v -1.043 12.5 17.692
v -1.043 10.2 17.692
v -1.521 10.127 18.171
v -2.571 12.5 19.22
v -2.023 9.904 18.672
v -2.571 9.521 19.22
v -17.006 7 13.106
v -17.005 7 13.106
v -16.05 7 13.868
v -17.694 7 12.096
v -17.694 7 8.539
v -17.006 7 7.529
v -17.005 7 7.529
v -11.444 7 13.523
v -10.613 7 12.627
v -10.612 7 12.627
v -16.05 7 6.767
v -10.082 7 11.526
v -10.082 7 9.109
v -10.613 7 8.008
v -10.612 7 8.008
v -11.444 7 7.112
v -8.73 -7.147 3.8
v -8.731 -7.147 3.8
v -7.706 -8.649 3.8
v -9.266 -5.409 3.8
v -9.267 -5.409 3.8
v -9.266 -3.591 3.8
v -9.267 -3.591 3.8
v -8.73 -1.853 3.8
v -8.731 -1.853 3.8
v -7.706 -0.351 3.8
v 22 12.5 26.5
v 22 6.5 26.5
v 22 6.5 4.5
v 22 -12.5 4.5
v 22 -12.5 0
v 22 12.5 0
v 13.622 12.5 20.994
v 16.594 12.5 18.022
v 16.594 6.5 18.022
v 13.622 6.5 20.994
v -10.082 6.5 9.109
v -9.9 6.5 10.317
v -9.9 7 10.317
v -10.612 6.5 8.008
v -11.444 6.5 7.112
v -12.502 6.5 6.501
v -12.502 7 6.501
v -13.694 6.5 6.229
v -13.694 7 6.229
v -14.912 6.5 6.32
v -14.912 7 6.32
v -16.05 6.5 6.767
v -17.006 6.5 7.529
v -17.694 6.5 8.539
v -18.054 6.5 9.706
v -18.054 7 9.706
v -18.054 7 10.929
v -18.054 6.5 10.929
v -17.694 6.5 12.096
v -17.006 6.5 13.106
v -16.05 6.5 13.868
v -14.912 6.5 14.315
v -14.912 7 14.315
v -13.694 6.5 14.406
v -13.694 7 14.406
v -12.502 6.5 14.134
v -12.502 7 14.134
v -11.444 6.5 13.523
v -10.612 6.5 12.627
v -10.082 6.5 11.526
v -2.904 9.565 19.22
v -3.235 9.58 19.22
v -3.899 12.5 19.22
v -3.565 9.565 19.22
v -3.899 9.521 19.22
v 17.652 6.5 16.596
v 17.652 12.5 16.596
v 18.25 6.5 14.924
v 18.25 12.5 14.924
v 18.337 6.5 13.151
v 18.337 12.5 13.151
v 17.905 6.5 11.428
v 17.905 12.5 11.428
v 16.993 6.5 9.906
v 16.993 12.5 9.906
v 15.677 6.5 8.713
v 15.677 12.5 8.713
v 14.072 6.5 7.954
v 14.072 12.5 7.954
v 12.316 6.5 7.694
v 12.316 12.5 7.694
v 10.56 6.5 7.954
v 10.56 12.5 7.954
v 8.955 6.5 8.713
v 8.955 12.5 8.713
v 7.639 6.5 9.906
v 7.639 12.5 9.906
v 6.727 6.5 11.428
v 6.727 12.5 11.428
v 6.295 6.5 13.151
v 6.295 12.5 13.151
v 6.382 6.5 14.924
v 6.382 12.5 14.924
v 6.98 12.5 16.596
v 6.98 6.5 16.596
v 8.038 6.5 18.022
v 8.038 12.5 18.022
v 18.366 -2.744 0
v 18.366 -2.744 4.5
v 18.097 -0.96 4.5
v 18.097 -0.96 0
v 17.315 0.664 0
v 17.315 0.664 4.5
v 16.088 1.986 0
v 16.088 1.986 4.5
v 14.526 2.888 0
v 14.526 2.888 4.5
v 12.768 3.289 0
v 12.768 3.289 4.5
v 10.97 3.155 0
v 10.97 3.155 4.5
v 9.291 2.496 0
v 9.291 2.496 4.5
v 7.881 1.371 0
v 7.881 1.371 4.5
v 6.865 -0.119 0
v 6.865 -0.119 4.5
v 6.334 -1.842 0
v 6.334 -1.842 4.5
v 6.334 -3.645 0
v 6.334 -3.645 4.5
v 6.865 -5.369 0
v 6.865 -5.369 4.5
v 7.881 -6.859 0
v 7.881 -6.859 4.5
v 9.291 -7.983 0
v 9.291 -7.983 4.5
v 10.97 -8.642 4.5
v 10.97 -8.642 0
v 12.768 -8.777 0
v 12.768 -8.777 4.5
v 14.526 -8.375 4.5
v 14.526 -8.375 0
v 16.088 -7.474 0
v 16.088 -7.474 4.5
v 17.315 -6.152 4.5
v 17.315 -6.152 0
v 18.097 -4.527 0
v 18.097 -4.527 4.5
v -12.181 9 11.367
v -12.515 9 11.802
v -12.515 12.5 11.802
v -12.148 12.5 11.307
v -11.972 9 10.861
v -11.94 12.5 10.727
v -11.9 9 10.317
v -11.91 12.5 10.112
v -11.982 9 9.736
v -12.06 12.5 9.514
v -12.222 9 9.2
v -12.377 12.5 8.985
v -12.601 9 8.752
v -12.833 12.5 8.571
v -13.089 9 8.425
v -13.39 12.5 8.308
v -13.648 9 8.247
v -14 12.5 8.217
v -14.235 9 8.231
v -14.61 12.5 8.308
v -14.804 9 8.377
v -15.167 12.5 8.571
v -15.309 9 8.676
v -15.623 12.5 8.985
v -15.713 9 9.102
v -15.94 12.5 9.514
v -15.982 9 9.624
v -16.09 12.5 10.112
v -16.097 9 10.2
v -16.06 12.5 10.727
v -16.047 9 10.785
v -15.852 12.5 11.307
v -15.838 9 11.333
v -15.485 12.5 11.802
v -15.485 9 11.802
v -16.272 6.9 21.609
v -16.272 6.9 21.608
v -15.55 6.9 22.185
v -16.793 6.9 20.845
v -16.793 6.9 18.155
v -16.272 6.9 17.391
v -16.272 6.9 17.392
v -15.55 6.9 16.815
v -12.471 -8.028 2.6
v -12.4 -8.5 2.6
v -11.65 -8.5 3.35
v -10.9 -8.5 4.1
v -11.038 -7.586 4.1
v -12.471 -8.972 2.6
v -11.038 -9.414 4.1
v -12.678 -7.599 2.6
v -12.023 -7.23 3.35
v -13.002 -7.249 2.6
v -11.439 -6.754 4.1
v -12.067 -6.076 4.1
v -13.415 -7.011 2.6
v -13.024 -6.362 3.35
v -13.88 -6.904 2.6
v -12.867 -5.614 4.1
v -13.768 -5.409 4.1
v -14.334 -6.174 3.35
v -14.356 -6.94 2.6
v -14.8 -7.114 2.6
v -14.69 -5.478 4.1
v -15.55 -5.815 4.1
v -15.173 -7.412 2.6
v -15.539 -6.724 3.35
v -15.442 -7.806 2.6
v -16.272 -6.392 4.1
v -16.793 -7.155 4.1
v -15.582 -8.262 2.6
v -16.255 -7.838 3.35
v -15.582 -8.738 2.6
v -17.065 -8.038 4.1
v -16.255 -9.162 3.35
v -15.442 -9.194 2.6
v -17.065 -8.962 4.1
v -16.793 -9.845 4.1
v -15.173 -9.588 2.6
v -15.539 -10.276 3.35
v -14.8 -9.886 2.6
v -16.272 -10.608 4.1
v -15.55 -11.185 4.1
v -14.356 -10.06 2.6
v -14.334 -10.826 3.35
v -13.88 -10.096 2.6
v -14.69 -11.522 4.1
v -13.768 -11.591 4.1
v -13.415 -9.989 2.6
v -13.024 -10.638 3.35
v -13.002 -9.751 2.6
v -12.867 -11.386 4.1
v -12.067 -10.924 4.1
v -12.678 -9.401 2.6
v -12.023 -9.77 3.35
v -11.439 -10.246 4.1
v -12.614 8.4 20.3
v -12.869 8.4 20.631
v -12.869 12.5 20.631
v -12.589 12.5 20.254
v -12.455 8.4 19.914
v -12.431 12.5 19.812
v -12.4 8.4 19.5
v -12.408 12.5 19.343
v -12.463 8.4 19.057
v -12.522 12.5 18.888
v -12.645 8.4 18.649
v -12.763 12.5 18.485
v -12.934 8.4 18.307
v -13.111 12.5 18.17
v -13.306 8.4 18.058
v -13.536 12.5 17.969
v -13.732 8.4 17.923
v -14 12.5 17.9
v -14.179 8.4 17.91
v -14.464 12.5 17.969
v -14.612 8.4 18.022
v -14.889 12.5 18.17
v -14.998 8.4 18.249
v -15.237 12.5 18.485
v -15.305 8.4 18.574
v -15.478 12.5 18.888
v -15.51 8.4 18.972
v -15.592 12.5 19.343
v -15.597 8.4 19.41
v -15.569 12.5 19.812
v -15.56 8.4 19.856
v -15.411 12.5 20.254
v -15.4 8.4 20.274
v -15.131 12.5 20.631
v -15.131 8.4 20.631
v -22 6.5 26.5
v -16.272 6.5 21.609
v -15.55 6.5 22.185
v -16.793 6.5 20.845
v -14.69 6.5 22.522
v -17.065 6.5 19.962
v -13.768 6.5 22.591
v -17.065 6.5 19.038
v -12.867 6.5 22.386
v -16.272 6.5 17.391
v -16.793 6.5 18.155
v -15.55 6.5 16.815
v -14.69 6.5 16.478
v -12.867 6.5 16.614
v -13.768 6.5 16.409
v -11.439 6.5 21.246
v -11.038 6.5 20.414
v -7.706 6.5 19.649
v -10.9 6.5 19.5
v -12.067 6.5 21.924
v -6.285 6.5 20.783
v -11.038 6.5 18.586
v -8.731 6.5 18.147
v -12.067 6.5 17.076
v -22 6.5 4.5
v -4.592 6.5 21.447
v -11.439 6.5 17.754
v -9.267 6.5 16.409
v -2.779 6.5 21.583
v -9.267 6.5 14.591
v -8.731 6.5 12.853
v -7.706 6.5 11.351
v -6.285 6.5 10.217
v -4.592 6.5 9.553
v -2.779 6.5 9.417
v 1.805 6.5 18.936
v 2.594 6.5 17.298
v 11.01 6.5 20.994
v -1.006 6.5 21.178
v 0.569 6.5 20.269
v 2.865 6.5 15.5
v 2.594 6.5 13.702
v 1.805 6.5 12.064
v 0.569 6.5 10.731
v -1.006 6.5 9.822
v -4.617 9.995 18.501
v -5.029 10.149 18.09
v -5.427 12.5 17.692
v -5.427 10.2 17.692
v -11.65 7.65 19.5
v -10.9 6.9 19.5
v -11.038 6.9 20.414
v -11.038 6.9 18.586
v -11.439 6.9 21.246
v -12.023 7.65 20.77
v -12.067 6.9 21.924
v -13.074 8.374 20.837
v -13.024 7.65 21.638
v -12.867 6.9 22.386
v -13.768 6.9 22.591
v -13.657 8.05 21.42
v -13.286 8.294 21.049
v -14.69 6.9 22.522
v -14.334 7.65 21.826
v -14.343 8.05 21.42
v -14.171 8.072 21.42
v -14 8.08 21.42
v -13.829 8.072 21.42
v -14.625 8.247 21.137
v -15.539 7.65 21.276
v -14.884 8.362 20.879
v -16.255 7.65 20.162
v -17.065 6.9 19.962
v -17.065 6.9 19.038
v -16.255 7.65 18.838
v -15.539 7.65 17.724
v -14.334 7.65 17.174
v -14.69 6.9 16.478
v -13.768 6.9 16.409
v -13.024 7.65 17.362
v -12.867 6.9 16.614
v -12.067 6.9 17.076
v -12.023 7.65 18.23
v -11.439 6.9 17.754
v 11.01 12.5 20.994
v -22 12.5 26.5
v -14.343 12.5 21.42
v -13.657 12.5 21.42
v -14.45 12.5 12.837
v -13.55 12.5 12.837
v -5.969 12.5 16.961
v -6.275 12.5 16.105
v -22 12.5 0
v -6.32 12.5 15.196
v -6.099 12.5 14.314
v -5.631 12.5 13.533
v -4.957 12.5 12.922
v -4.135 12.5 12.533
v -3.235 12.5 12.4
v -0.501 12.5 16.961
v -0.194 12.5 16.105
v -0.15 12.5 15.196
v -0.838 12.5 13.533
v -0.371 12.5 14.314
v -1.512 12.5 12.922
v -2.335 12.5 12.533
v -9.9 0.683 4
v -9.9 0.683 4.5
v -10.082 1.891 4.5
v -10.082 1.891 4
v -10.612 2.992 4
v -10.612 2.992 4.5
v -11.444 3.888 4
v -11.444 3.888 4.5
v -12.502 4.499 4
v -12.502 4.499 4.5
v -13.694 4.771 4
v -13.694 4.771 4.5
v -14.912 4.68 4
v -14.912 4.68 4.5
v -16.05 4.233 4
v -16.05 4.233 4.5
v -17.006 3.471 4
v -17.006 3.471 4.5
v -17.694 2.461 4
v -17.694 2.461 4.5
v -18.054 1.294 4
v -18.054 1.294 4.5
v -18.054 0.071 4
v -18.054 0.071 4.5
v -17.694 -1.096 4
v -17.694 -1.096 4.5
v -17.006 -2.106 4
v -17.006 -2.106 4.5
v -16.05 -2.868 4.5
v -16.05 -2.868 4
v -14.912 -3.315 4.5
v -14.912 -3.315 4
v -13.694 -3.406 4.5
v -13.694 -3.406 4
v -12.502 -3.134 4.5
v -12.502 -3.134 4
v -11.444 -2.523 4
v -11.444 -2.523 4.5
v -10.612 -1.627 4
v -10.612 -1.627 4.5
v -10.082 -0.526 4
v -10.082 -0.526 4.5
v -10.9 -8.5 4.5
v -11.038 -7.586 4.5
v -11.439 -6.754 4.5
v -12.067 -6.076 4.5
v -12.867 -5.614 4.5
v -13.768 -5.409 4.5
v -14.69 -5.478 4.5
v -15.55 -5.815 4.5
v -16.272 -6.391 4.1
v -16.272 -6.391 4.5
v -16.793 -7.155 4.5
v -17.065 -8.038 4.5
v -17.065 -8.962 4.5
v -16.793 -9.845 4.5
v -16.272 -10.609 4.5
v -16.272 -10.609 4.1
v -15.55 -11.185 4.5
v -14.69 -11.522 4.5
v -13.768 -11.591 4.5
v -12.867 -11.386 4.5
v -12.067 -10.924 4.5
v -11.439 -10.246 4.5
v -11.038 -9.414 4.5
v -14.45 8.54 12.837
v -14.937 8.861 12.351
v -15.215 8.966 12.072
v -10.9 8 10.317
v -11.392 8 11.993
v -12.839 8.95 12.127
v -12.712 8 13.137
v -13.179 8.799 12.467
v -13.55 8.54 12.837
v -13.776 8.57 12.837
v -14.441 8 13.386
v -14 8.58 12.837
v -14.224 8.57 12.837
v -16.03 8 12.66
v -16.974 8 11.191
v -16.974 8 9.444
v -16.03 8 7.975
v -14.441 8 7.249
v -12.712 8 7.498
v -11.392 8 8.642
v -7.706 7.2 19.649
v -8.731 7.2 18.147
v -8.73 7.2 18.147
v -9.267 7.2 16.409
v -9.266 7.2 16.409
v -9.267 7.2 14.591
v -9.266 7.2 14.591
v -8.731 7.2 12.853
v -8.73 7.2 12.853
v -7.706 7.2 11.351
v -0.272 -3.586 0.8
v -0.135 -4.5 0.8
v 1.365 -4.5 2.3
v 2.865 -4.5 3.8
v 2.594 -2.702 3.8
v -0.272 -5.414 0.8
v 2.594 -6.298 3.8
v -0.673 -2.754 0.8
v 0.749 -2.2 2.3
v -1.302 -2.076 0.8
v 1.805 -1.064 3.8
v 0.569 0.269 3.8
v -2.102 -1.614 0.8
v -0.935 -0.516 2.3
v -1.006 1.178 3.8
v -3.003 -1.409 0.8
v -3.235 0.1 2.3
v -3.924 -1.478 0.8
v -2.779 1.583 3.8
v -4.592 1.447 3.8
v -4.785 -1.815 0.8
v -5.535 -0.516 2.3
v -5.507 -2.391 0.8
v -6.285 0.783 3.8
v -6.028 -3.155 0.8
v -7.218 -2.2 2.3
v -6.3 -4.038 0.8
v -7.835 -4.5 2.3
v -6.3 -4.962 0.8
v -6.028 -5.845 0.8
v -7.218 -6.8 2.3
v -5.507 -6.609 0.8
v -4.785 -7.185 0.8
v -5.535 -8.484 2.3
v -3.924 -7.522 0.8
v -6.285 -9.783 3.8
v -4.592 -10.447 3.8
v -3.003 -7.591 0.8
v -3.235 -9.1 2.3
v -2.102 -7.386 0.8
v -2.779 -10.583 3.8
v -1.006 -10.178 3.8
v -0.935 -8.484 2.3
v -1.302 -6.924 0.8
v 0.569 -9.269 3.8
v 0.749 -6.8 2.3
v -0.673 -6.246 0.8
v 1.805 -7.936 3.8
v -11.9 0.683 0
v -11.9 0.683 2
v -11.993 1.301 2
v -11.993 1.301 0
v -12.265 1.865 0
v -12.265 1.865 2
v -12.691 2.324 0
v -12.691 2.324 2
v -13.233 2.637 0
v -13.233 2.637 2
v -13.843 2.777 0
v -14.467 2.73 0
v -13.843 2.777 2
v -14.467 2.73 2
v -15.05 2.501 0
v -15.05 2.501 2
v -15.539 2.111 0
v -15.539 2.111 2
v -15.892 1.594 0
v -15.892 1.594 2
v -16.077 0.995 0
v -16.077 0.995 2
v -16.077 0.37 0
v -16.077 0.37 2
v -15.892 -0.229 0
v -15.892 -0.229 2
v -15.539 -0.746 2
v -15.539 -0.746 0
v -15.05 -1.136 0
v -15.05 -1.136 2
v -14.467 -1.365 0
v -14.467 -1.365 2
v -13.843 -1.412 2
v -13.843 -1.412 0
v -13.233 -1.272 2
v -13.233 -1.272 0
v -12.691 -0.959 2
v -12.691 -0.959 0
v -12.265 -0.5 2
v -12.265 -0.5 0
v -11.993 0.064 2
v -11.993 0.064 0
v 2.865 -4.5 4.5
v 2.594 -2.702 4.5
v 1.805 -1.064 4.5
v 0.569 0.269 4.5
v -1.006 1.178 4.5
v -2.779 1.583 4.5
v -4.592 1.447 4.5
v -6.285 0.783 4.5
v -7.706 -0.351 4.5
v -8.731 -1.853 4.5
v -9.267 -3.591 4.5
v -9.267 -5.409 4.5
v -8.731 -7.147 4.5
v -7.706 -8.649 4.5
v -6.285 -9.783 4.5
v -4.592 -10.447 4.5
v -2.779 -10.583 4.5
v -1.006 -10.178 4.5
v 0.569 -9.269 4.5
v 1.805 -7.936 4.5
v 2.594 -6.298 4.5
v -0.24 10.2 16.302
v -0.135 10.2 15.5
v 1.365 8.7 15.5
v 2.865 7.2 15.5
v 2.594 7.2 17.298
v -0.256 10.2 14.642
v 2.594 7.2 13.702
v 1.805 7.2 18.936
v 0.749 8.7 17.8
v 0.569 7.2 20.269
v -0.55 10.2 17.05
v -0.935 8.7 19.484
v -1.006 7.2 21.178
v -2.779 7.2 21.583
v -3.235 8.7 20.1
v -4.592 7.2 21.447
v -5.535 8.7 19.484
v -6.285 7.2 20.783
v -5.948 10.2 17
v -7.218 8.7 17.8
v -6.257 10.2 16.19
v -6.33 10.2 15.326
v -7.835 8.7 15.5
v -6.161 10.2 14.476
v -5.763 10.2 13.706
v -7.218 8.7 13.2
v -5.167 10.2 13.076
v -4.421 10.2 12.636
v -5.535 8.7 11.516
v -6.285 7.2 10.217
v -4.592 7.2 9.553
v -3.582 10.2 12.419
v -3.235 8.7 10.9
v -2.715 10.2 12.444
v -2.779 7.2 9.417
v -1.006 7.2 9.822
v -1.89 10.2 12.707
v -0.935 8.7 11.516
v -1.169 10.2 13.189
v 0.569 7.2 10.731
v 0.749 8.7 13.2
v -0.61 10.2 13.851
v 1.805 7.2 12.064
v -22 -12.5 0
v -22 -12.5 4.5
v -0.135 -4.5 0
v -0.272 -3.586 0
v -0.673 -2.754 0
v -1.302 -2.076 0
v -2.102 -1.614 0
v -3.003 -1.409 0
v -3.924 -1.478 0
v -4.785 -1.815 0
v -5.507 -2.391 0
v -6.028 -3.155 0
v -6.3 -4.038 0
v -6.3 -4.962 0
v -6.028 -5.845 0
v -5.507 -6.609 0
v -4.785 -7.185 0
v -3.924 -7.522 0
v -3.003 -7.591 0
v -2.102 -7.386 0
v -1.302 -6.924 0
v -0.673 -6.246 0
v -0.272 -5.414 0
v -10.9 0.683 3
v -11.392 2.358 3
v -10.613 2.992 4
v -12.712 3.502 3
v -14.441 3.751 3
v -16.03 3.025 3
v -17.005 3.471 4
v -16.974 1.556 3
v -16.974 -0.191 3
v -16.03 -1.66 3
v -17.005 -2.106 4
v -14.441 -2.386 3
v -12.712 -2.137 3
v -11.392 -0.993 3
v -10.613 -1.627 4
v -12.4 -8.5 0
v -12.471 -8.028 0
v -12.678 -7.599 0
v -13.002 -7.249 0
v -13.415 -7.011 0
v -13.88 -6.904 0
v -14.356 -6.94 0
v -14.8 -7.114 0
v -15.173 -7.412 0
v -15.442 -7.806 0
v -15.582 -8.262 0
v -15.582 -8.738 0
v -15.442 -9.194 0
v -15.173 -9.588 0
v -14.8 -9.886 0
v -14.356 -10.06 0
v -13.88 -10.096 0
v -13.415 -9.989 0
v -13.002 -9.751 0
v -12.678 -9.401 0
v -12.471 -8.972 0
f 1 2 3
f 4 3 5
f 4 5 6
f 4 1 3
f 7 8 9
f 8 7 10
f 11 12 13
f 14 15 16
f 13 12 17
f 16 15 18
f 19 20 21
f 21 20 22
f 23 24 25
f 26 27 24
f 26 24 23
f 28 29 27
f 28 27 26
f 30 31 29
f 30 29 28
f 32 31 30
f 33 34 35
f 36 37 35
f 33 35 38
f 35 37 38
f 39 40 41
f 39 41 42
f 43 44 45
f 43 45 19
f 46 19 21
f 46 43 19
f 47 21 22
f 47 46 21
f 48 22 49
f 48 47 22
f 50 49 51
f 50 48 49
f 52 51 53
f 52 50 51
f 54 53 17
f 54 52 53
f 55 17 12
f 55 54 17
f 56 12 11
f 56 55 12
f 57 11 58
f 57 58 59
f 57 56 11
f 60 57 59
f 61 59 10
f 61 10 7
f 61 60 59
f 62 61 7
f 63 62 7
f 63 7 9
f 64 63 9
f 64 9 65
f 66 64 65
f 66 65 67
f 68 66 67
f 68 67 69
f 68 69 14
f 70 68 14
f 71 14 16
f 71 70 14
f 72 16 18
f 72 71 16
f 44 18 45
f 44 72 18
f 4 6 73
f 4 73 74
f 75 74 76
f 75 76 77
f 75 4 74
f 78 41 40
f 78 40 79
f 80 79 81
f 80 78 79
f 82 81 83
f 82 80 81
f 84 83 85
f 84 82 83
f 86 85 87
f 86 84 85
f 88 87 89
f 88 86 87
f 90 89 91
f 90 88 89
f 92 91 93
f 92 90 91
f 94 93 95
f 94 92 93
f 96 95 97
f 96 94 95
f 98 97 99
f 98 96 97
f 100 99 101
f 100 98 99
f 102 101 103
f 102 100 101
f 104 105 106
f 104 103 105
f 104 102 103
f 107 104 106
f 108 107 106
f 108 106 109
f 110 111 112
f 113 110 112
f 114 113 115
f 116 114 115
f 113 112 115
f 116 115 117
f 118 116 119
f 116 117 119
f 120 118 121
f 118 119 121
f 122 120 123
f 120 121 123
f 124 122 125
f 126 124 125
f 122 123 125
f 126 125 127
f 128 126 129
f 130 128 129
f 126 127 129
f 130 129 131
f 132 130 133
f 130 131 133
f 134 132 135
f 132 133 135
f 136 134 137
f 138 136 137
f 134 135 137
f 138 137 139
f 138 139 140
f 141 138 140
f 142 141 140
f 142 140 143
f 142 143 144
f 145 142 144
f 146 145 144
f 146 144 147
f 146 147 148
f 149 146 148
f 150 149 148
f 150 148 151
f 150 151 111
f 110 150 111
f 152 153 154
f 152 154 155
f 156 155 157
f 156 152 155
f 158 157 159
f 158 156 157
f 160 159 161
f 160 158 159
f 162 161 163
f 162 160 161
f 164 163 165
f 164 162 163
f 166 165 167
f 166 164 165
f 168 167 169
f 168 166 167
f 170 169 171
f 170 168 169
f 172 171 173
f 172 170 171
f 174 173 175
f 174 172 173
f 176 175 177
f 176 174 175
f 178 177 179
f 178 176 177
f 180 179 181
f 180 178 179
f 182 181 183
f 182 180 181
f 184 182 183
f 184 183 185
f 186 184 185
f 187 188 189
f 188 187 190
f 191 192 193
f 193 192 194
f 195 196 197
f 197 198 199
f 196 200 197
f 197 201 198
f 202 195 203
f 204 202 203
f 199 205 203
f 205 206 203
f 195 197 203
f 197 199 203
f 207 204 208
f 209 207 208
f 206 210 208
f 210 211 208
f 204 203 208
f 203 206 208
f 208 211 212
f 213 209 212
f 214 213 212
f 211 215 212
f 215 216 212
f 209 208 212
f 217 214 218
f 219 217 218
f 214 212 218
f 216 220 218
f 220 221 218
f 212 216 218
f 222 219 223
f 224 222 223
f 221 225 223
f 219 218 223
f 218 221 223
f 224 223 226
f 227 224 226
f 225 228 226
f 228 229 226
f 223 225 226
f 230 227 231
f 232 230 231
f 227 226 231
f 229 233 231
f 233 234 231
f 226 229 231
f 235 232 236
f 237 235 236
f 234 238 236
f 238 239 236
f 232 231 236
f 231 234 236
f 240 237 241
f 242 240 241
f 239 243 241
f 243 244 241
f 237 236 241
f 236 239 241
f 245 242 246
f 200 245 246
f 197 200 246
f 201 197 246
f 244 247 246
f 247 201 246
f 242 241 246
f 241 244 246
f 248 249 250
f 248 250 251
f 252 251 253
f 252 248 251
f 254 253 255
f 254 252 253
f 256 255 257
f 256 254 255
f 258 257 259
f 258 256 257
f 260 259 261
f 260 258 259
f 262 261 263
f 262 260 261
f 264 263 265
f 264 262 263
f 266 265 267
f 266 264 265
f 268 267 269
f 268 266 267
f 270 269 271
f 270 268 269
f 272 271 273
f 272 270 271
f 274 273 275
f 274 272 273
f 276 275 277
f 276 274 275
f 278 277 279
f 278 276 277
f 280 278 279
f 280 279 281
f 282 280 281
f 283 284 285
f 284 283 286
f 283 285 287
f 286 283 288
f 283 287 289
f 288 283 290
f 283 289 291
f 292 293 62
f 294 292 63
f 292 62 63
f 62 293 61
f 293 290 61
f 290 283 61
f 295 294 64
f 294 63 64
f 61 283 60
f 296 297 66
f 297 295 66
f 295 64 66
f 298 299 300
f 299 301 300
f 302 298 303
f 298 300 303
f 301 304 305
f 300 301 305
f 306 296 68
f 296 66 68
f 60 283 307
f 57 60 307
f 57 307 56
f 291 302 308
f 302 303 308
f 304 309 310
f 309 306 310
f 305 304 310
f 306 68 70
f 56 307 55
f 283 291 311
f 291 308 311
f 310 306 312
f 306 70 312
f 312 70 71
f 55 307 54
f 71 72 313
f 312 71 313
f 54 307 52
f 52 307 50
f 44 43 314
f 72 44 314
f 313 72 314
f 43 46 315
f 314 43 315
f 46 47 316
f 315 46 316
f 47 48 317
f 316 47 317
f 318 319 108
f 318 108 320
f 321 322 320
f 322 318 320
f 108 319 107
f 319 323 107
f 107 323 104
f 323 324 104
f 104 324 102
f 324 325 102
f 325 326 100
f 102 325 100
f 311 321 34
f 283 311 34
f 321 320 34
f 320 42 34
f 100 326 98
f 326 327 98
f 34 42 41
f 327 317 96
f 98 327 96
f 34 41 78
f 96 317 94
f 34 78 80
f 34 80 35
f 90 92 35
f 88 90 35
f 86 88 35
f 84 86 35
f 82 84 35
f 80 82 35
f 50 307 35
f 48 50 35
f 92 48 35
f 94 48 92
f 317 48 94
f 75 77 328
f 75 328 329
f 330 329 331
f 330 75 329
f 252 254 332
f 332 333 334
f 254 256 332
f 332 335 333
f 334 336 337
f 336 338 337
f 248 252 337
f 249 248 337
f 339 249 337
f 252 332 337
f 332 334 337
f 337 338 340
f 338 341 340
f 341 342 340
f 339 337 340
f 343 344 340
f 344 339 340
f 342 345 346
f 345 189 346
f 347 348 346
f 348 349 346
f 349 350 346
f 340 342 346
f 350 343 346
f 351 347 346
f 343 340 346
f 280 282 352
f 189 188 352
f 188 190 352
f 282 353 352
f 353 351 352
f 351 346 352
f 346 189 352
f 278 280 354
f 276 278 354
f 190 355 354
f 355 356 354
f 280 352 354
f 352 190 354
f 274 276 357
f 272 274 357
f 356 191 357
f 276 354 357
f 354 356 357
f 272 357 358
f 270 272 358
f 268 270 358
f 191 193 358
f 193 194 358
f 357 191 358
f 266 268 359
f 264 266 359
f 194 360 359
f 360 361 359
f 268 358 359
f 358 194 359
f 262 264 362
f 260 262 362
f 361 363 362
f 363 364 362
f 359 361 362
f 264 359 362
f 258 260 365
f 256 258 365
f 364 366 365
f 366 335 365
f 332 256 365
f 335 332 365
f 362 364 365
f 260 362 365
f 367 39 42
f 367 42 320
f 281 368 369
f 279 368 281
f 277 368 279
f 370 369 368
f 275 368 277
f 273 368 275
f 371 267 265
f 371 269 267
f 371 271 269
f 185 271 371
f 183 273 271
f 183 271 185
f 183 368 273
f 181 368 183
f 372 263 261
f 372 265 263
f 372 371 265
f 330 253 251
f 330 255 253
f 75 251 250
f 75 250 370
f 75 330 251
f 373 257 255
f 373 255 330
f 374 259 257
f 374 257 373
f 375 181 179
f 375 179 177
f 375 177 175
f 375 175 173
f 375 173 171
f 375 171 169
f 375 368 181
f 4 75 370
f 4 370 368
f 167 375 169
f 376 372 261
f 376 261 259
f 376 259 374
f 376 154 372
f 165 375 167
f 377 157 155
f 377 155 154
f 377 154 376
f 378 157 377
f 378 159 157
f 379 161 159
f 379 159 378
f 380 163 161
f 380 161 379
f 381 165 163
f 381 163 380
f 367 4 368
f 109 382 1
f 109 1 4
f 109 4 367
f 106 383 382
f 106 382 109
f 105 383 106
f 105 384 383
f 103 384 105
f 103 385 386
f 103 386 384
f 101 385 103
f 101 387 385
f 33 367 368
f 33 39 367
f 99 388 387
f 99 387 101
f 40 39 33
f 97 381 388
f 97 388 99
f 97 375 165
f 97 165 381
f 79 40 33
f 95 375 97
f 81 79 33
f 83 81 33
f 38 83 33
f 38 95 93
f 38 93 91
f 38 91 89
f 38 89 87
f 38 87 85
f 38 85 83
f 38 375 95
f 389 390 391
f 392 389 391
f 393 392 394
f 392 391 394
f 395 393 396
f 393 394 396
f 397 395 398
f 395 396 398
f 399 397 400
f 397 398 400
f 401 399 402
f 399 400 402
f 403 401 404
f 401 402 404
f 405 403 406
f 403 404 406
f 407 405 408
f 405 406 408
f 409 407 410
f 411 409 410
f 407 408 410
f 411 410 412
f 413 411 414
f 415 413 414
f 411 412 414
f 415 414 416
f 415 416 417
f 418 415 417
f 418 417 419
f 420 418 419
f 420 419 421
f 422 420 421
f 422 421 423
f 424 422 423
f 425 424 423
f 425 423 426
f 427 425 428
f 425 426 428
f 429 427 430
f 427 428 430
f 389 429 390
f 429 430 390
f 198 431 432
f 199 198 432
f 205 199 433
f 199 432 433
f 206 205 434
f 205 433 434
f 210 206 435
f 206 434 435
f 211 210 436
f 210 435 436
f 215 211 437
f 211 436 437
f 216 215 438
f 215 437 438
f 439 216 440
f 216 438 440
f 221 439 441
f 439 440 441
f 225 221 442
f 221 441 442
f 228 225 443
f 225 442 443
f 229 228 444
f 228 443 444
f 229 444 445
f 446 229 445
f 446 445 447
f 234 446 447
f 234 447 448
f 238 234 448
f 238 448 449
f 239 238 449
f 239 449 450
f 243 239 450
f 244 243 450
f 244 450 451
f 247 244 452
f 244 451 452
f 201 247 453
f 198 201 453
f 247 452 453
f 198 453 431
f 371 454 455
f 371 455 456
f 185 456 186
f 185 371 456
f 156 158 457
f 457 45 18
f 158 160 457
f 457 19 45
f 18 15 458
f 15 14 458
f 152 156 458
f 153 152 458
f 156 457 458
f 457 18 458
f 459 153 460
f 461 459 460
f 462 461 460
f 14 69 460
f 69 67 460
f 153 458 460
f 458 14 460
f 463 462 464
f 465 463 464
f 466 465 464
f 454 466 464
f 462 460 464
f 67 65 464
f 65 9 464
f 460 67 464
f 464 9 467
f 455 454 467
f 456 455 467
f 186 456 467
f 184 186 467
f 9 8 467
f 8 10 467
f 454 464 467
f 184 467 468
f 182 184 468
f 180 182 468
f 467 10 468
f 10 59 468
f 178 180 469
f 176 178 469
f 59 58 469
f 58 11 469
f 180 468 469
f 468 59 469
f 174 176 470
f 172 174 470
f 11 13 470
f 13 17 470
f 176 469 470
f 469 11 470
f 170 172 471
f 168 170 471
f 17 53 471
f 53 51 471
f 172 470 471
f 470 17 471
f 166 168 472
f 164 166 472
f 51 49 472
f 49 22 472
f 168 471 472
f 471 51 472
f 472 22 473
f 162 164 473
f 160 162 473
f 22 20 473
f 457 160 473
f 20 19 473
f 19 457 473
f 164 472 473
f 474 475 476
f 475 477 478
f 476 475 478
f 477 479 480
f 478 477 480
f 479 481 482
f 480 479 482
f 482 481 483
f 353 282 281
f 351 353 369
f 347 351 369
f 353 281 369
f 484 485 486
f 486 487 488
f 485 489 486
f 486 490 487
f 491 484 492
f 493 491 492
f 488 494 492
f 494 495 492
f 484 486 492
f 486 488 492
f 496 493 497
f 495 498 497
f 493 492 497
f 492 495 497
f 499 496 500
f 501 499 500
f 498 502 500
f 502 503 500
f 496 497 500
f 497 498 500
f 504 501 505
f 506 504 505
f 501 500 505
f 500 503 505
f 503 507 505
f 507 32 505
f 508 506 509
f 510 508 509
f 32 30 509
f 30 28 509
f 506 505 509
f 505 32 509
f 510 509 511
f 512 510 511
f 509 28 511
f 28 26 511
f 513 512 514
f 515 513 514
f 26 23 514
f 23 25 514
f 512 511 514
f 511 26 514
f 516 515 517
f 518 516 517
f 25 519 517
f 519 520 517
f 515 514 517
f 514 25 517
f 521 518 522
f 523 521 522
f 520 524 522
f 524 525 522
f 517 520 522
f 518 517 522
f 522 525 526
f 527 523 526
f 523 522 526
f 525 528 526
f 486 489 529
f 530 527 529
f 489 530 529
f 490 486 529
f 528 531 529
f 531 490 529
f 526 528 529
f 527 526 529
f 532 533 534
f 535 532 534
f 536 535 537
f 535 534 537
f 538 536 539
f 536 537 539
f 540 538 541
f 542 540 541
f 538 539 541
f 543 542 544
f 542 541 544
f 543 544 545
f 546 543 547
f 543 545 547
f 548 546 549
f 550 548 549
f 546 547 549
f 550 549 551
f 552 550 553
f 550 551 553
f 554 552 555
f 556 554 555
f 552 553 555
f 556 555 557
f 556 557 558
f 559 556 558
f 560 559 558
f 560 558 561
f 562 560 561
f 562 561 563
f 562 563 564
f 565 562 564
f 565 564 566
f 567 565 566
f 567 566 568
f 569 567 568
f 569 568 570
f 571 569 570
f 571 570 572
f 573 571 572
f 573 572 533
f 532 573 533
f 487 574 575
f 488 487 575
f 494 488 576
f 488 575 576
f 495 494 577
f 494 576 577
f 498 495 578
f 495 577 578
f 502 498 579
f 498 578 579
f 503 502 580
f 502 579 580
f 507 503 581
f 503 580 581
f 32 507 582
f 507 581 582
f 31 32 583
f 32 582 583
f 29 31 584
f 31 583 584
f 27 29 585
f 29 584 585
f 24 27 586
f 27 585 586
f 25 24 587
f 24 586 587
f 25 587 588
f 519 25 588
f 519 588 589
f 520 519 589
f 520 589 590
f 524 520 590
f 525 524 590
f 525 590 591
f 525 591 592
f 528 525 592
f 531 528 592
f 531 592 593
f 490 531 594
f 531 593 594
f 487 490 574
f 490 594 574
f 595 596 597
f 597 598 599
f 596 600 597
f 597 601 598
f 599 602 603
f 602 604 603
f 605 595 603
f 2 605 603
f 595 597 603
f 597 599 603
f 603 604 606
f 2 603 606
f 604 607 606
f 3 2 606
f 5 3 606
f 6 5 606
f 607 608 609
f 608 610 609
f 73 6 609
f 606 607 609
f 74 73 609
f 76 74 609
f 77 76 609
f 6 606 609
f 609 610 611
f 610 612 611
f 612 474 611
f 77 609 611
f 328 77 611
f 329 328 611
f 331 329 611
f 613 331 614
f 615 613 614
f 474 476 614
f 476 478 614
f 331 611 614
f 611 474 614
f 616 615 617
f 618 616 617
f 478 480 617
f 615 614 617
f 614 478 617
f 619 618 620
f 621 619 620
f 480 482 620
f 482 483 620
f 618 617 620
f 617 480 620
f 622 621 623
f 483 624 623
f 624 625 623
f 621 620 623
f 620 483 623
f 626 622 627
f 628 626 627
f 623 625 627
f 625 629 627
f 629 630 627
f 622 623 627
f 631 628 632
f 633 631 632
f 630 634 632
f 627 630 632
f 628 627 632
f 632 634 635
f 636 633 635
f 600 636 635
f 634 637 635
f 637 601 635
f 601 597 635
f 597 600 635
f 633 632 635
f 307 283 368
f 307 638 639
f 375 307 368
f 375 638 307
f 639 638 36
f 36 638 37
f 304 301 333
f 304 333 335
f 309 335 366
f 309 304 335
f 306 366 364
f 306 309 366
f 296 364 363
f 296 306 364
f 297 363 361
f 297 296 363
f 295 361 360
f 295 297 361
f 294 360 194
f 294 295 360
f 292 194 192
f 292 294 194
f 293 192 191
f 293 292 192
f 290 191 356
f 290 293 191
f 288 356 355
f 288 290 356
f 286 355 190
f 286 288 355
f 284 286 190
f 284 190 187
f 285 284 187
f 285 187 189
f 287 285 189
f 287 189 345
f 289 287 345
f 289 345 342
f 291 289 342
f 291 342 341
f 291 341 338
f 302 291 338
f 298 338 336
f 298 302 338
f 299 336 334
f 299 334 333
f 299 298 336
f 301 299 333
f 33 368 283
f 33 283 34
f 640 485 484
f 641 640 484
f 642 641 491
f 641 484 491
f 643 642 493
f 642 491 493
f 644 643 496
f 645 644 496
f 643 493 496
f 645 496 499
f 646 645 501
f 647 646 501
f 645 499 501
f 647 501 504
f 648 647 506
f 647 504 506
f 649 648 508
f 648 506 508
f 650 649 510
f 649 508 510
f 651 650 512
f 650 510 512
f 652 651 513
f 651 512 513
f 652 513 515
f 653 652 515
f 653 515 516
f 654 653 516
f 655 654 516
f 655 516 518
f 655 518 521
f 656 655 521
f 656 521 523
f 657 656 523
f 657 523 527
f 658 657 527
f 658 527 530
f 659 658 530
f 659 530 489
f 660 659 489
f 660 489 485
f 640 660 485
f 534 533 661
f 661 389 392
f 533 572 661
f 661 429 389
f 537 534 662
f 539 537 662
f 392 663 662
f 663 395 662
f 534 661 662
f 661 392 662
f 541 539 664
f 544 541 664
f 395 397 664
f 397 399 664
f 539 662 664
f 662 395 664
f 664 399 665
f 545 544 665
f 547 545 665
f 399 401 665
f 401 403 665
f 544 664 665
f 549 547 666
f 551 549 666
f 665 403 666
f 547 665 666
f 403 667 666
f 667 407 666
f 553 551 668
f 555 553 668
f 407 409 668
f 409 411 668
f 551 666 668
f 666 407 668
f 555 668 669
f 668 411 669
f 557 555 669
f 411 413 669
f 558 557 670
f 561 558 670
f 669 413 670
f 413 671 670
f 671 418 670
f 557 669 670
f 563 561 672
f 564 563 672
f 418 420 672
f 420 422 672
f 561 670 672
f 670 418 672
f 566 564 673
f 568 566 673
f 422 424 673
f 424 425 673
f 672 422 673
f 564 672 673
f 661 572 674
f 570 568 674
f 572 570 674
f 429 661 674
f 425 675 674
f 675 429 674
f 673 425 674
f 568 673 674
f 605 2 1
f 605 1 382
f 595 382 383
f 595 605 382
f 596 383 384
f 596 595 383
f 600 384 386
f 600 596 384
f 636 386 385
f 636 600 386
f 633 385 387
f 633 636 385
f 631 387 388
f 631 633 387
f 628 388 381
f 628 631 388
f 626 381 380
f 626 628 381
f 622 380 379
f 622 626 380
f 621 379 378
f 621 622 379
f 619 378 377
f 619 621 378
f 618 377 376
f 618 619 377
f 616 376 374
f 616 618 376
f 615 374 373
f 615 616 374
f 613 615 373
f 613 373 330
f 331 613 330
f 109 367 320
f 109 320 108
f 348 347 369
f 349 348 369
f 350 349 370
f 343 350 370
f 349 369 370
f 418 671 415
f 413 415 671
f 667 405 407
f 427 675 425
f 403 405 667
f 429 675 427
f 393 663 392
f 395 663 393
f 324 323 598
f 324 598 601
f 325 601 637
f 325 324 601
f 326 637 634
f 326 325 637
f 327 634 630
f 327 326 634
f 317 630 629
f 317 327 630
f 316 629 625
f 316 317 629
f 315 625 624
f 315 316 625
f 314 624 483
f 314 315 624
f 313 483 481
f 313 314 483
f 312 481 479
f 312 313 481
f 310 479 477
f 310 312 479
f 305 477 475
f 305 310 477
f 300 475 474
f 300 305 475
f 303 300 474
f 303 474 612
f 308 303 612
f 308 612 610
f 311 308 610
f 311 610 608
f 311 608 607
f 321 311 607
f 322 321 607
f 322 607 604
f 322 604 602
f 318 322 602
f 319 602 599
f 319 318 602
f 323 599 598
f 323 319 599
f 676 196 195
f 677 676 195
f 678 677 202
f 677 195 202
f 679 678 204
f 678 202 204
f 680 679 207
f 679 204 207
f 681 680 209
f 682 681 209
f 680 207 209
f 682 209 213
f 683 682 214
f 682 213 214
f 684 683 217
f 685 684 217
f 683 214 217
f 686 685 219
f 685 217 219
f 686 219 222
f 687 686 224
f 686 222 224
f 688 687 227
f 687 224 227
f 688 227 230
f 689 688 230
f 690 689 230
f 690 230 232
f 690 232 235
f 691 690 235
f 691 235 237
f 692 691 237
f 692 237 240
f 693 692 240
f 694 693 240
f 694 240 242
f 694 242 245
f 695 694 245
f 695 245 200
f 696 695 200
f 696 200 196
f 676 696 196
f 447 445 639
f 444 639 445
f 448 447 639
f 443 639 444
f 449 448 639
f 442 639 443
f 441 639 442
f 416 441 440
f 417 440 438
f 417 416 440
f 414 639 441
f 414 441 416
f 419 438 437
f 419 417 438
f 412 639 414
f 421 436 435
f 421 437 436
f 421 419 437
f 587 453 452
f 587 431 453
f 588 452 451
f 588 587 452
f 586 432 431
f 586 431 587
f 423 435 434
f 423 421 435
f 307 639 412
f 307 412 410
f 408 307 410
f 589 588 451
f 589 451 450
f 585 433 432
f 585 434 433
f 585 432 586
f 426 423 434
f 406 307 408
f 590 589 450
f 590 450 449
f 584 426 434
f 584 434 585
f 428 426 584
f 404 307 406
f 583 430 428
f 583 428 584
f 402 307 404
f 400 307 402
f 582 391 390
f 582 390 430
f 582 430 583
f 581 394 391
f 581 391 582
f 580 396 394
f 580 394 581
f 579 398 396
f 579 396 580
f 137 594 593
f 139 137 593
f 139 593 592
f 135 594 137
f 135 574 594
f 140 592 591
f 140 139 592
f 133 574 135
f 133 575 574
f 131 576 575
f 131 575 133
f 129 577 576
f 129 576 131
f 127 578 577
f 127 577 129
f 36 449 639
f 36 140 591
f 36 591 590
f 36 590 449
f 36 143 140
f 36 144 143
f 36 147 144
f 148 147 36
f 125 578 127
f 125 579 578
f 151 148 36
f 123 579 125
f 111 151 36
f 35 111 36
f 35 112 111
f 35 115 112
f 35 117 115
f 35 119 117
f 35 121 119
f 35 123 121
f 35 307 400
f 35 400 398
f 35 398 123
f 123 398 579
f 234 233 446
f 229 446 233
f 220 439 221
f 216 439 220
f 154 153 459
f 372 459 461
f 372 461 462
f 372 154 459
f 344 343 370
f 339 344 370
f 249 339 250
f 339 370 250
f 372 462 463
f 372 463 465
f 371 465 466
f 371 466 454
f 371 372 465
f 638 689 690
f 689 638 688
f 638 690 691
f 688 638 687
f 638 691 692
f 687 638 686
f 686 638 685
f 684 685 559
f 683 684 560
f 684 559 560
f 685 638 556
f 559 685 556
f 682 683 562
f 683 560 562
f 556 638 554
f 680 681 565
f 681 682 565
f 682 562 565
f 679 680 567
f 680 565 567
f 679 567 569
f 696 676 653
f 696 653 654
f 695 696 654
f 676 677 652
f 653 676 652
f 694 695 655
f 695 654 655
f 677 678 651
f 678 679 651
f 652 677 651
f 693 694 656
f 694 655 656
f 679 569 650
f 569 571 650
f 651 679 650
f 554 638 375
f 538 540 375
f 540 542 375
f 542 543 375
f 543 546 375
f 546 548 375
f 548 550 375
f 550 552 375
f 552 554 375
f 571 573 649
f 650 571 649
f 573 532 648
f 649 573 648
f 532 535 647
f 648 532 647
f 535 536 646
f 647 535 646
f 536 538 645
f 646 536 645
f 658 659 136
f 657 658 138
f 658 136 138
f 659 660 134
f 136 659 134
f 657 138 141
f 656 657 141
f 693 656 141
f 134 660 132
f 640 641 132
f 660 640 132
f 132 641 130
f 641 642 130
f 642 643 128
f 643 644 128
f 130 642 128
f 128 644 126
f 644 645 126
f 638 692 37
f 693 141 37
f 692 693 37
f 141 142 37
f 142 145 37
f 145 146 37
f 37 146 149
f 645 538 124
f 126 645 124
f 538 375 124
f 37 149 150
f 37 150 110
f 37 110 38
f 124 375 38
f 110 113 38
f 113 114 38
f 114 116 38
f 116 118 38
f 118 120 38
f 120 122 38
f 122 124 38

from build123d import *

# Parameters (mm, degrees)
SKETCH1_W                = 44
SKETCH1_H                = 25
BOSS_EXTRUDE1_DEPTH      = 4.5
SKETCH2_W                = 44
SKETCH2_H                = 6
BOSS_EXTRUDE2_DEPTH      = 22
SKETCH3_R                = 1.6
SKETCH3_R_2              = 2.1
SKETCH3_R_3              = 3.1
SKETCH3_R_4              = 6.05
CUT_EXTRUDE1_DEPTH       = 34.529837459
SKETCH4_R                = 6.1
CUT_EXTRUDE2_DEPTH       = 0.7
SKETCH5_R                = 4.1
CUT_EXTRUDE3_DEPTH       = 0.5
SKETCH6_R                = 3.1
CUT_EXTRUDE4_DEPTH       = 0.4
CHAMFER4_SIZE            = 3
CHAMFER5_SIZE            = 2
CHAMFER6_SIZE            = 1.5
CHAMFER4_OF_MIRROR1_SIZE = 3
CHAMFER5_OF_MIRROR1_SIZE = 2
CHAMFER6_OF_MIRROR1_SIZE = 1.5
CUT_EXTRUDE5_DEPTH       = 43.558782877


with BuildPart() as part:
    # Sketch1 → Boss-Extrude1 (new body)
    with BuildSketch(Plane.XY):
        Rectangle(SKETCH1_W, SKETCH1_H)
    extrude(amount=BOSS_EXTRUDE1_DEPTH)

    # Sketch2 → Boss-Extrude2 (add)
    with BuildSketch(Plane.XY.offset(4.5)):
        with Locations((0, 9.5)):
            Rectangle(SKETCH2_W, SKETCH2_H)
    extrude(amount=BOSS_EXTRUDE2_DEPTH)

    # Sketch3 → Cut-Extrude1 (cut, through all)
    with BuildSketch(Plane.XY.offset(4.5)):
        with Locations((-14, -8.5)):
            Circle(SKETCH3_R)
        with Locations((-14, 0.682507664)):
            Circle(SKETCH3_R_2)
        with Locations((-3.234639789, -4.5)):
            Circle(SKETCH3_R_3)
        with Locations((12.315992983, -2.743651106)):
            Circle(SKETCH3_R_4)
    cut_extrude1 = extrude(amount=-CUT_EXTRUDE1_DEPTH, mode=Mode.SUBTRACT)

    # Sketch4 → Cut-Extrude2 (cut)
    with BuildSketch(Plane.XY.offset(4.5)):
        with Locations((-3.234639789, -4.5)):
            Circle(SKETCH4_R)
    cut_extrude2 = extrude(amount=-CUT_EXTRUDE2_DEPTH, mode=Mode.SUBTRACT)

    # Sketch5 → Cut-Extrude3 (cut)
    with BuildSketch(Plane.XY.offset(4.5)):
        with Locations((-14, 0.682507664)):
            Circle(SKETCH5_R)
    cut_extrude3 = extrude(amount=-CUT_EXTRUDE3_DEPTH, mode=Mode.SUBTRACT)

    # Sketch6 → Cut-Extrude4 (cut)
    with BuildSketch(Plane.XY.offset(4.5)):
        with Locations((-14, -8.5)):
            Circle(SKETCH6_R)
    cut_extrude4 = extrude(amount=-CUT_EXTRUDE4_DEPTH, mode=Mode.SUBTRACT)

    # Chamfer4
    chamfer4_edges = [part.edges().sort_by_distance(p)[0] for p in [
        (-6.334639789, -4.5, 3.8),
    ]]
    chamfer(chamfer4_edges, length=CHAMFER4_SIZE - 0.0001)  # a hair under: the kernel refuses the full size

    # Chamfer5
    chamfer5_edges = [part.edges().sort_by_distance(p)[0] for p in [
        (-16.1, 0.682507664, 4),
    ]]
    chamfer(chamfer5_edges, length=CHAMFER5_SIZE - 0.0001)  # a hair under: the kernel refuses the full size

    # Chamfer6
    chamfer6_edges = [part.edges().sort_by_distance(p)[0] for p in [
        (-15.6, -8.5, 4.1),
    ]]
    chamfer(chamfer6_edges, length=CHAMFER6_SIZE - 0.0001)  # a hair under: the kernel refuses the full size

    # Mirror1: Cut-Extrude1, Cut-Extrude2, Cut-Extrude3, Cut-Extrude4 across plane
    add(cut_extrude1.mirror(Plane(origin=(0, 5.5, 5.5), x_dir=(0, -0.7071067811865512, 0.7071067811865439), z_dir=(0, -0.7071067811865438, -0.7071067811865512))), mode=Mode.SUBTRACT)
    add(cut_extrude2.mirror(Plane(origin=(0, 5.5, 5.5), x_dir=(0, -0.7071067811865512, 0.7071067811865439), z_dir=(0, -0.7071067811865438, -0.7071067811865512))), mode=Mode.SUBTRACT)
    add(cut_extrude3.mirror(Plane(origin=(0, 5.5, 5.5), x_dir=(0, -0.7071067811865512, 0.7071067811865439), z_dir=(0, -0.7071067811865438, -0.7071067811865512))), mode=Mode.SUBTRACT)
    add(cut_extrude4.mirror(Plane(origin=(0, 5.5, 5.5), x_dir=(0, -0.7071067811865512, 0.7071067811865439), z_dir=(0, -0.7071067811865438, -0.7071067811865512))), mode=Mode.SUBTRACT)

    # Chamfer4 of Mirror1
    chamfer4_of_mirror1_edges = [part.edges().sort_by_distance(p)[0] for p in [
        (-6.334639789, 7.2, 15.5),
    ]]
    chamfer(chamfer4_of_mirror1_edges, length=CHAMFER4_OF_MIRROR1_SIZE - 0.0001)  # a hair under: the kernel refuses the full size

    # Chamfer5 of Mirror1
    chamfer5_of_mirror1_edges = [part.edges().sort_by_distance(p)[0] for p in [
        (-16.1, 7, 10.317492336),
    ]]
    chamfer(chamfer5_of_mirror1_edges, length=CHAMFER5_OF_MIRROR1_SIZE - 0.0001)  # a hair under: the kernel refuses the full size

    # Chamfer6 of Mirror1
    chamfer6_of_mirror1_edges = [part.edges().sort_by_distance(p)[0] for p in [
        (-15.6, 6.9, 19.5),
    ]]
    chamfer(chamfer6_of_mirror1_edges, length=CHAMFER6_OF_MIRROR1_SIZE - 0.0001)  # a hair under: the kernel refuses the full size

    # Sketch7 → Cut-Extrude5 (cut, through all)
    with BuildSketch(Plane(origin=(0, 12.5, 0), x_dir=(1, 0, 0), z_dir=(0, 1, 0))):
        Polygon((-14.3427417, -21.42), (-13.6572583, -21.42), (-12.86862915, -20.63137085), (-14, -19.5), (-15.13137085, -20.63137085), align=None)
        Polygon((-3.234639789, -15.5), (-1.042608767, -17.692031022), (-2.570577745, -19.22), (-3.898701832, -19.22), (-5.42667081, -17.692031022), align=None)
        Polygon((12.315992983, -13.743651106), (16.593989009, -18.021647132), (13.621985035, -20.993651106), (11.010000931, -20.993651106), (8.037996957, -18.021647132), align=None)
        Polygon((-14, -10.317492336), (-12.51507576, -11.802416576), (-13.550151519, -12.837492336), (-14.449848481, -12.837492336), (-15.48492424, -11.802416576), align=None)
    extrude(amount=-CUT_EXTRUDE5_DEPTH, mode=Mode.SUBTRACT)


solid = part.part
